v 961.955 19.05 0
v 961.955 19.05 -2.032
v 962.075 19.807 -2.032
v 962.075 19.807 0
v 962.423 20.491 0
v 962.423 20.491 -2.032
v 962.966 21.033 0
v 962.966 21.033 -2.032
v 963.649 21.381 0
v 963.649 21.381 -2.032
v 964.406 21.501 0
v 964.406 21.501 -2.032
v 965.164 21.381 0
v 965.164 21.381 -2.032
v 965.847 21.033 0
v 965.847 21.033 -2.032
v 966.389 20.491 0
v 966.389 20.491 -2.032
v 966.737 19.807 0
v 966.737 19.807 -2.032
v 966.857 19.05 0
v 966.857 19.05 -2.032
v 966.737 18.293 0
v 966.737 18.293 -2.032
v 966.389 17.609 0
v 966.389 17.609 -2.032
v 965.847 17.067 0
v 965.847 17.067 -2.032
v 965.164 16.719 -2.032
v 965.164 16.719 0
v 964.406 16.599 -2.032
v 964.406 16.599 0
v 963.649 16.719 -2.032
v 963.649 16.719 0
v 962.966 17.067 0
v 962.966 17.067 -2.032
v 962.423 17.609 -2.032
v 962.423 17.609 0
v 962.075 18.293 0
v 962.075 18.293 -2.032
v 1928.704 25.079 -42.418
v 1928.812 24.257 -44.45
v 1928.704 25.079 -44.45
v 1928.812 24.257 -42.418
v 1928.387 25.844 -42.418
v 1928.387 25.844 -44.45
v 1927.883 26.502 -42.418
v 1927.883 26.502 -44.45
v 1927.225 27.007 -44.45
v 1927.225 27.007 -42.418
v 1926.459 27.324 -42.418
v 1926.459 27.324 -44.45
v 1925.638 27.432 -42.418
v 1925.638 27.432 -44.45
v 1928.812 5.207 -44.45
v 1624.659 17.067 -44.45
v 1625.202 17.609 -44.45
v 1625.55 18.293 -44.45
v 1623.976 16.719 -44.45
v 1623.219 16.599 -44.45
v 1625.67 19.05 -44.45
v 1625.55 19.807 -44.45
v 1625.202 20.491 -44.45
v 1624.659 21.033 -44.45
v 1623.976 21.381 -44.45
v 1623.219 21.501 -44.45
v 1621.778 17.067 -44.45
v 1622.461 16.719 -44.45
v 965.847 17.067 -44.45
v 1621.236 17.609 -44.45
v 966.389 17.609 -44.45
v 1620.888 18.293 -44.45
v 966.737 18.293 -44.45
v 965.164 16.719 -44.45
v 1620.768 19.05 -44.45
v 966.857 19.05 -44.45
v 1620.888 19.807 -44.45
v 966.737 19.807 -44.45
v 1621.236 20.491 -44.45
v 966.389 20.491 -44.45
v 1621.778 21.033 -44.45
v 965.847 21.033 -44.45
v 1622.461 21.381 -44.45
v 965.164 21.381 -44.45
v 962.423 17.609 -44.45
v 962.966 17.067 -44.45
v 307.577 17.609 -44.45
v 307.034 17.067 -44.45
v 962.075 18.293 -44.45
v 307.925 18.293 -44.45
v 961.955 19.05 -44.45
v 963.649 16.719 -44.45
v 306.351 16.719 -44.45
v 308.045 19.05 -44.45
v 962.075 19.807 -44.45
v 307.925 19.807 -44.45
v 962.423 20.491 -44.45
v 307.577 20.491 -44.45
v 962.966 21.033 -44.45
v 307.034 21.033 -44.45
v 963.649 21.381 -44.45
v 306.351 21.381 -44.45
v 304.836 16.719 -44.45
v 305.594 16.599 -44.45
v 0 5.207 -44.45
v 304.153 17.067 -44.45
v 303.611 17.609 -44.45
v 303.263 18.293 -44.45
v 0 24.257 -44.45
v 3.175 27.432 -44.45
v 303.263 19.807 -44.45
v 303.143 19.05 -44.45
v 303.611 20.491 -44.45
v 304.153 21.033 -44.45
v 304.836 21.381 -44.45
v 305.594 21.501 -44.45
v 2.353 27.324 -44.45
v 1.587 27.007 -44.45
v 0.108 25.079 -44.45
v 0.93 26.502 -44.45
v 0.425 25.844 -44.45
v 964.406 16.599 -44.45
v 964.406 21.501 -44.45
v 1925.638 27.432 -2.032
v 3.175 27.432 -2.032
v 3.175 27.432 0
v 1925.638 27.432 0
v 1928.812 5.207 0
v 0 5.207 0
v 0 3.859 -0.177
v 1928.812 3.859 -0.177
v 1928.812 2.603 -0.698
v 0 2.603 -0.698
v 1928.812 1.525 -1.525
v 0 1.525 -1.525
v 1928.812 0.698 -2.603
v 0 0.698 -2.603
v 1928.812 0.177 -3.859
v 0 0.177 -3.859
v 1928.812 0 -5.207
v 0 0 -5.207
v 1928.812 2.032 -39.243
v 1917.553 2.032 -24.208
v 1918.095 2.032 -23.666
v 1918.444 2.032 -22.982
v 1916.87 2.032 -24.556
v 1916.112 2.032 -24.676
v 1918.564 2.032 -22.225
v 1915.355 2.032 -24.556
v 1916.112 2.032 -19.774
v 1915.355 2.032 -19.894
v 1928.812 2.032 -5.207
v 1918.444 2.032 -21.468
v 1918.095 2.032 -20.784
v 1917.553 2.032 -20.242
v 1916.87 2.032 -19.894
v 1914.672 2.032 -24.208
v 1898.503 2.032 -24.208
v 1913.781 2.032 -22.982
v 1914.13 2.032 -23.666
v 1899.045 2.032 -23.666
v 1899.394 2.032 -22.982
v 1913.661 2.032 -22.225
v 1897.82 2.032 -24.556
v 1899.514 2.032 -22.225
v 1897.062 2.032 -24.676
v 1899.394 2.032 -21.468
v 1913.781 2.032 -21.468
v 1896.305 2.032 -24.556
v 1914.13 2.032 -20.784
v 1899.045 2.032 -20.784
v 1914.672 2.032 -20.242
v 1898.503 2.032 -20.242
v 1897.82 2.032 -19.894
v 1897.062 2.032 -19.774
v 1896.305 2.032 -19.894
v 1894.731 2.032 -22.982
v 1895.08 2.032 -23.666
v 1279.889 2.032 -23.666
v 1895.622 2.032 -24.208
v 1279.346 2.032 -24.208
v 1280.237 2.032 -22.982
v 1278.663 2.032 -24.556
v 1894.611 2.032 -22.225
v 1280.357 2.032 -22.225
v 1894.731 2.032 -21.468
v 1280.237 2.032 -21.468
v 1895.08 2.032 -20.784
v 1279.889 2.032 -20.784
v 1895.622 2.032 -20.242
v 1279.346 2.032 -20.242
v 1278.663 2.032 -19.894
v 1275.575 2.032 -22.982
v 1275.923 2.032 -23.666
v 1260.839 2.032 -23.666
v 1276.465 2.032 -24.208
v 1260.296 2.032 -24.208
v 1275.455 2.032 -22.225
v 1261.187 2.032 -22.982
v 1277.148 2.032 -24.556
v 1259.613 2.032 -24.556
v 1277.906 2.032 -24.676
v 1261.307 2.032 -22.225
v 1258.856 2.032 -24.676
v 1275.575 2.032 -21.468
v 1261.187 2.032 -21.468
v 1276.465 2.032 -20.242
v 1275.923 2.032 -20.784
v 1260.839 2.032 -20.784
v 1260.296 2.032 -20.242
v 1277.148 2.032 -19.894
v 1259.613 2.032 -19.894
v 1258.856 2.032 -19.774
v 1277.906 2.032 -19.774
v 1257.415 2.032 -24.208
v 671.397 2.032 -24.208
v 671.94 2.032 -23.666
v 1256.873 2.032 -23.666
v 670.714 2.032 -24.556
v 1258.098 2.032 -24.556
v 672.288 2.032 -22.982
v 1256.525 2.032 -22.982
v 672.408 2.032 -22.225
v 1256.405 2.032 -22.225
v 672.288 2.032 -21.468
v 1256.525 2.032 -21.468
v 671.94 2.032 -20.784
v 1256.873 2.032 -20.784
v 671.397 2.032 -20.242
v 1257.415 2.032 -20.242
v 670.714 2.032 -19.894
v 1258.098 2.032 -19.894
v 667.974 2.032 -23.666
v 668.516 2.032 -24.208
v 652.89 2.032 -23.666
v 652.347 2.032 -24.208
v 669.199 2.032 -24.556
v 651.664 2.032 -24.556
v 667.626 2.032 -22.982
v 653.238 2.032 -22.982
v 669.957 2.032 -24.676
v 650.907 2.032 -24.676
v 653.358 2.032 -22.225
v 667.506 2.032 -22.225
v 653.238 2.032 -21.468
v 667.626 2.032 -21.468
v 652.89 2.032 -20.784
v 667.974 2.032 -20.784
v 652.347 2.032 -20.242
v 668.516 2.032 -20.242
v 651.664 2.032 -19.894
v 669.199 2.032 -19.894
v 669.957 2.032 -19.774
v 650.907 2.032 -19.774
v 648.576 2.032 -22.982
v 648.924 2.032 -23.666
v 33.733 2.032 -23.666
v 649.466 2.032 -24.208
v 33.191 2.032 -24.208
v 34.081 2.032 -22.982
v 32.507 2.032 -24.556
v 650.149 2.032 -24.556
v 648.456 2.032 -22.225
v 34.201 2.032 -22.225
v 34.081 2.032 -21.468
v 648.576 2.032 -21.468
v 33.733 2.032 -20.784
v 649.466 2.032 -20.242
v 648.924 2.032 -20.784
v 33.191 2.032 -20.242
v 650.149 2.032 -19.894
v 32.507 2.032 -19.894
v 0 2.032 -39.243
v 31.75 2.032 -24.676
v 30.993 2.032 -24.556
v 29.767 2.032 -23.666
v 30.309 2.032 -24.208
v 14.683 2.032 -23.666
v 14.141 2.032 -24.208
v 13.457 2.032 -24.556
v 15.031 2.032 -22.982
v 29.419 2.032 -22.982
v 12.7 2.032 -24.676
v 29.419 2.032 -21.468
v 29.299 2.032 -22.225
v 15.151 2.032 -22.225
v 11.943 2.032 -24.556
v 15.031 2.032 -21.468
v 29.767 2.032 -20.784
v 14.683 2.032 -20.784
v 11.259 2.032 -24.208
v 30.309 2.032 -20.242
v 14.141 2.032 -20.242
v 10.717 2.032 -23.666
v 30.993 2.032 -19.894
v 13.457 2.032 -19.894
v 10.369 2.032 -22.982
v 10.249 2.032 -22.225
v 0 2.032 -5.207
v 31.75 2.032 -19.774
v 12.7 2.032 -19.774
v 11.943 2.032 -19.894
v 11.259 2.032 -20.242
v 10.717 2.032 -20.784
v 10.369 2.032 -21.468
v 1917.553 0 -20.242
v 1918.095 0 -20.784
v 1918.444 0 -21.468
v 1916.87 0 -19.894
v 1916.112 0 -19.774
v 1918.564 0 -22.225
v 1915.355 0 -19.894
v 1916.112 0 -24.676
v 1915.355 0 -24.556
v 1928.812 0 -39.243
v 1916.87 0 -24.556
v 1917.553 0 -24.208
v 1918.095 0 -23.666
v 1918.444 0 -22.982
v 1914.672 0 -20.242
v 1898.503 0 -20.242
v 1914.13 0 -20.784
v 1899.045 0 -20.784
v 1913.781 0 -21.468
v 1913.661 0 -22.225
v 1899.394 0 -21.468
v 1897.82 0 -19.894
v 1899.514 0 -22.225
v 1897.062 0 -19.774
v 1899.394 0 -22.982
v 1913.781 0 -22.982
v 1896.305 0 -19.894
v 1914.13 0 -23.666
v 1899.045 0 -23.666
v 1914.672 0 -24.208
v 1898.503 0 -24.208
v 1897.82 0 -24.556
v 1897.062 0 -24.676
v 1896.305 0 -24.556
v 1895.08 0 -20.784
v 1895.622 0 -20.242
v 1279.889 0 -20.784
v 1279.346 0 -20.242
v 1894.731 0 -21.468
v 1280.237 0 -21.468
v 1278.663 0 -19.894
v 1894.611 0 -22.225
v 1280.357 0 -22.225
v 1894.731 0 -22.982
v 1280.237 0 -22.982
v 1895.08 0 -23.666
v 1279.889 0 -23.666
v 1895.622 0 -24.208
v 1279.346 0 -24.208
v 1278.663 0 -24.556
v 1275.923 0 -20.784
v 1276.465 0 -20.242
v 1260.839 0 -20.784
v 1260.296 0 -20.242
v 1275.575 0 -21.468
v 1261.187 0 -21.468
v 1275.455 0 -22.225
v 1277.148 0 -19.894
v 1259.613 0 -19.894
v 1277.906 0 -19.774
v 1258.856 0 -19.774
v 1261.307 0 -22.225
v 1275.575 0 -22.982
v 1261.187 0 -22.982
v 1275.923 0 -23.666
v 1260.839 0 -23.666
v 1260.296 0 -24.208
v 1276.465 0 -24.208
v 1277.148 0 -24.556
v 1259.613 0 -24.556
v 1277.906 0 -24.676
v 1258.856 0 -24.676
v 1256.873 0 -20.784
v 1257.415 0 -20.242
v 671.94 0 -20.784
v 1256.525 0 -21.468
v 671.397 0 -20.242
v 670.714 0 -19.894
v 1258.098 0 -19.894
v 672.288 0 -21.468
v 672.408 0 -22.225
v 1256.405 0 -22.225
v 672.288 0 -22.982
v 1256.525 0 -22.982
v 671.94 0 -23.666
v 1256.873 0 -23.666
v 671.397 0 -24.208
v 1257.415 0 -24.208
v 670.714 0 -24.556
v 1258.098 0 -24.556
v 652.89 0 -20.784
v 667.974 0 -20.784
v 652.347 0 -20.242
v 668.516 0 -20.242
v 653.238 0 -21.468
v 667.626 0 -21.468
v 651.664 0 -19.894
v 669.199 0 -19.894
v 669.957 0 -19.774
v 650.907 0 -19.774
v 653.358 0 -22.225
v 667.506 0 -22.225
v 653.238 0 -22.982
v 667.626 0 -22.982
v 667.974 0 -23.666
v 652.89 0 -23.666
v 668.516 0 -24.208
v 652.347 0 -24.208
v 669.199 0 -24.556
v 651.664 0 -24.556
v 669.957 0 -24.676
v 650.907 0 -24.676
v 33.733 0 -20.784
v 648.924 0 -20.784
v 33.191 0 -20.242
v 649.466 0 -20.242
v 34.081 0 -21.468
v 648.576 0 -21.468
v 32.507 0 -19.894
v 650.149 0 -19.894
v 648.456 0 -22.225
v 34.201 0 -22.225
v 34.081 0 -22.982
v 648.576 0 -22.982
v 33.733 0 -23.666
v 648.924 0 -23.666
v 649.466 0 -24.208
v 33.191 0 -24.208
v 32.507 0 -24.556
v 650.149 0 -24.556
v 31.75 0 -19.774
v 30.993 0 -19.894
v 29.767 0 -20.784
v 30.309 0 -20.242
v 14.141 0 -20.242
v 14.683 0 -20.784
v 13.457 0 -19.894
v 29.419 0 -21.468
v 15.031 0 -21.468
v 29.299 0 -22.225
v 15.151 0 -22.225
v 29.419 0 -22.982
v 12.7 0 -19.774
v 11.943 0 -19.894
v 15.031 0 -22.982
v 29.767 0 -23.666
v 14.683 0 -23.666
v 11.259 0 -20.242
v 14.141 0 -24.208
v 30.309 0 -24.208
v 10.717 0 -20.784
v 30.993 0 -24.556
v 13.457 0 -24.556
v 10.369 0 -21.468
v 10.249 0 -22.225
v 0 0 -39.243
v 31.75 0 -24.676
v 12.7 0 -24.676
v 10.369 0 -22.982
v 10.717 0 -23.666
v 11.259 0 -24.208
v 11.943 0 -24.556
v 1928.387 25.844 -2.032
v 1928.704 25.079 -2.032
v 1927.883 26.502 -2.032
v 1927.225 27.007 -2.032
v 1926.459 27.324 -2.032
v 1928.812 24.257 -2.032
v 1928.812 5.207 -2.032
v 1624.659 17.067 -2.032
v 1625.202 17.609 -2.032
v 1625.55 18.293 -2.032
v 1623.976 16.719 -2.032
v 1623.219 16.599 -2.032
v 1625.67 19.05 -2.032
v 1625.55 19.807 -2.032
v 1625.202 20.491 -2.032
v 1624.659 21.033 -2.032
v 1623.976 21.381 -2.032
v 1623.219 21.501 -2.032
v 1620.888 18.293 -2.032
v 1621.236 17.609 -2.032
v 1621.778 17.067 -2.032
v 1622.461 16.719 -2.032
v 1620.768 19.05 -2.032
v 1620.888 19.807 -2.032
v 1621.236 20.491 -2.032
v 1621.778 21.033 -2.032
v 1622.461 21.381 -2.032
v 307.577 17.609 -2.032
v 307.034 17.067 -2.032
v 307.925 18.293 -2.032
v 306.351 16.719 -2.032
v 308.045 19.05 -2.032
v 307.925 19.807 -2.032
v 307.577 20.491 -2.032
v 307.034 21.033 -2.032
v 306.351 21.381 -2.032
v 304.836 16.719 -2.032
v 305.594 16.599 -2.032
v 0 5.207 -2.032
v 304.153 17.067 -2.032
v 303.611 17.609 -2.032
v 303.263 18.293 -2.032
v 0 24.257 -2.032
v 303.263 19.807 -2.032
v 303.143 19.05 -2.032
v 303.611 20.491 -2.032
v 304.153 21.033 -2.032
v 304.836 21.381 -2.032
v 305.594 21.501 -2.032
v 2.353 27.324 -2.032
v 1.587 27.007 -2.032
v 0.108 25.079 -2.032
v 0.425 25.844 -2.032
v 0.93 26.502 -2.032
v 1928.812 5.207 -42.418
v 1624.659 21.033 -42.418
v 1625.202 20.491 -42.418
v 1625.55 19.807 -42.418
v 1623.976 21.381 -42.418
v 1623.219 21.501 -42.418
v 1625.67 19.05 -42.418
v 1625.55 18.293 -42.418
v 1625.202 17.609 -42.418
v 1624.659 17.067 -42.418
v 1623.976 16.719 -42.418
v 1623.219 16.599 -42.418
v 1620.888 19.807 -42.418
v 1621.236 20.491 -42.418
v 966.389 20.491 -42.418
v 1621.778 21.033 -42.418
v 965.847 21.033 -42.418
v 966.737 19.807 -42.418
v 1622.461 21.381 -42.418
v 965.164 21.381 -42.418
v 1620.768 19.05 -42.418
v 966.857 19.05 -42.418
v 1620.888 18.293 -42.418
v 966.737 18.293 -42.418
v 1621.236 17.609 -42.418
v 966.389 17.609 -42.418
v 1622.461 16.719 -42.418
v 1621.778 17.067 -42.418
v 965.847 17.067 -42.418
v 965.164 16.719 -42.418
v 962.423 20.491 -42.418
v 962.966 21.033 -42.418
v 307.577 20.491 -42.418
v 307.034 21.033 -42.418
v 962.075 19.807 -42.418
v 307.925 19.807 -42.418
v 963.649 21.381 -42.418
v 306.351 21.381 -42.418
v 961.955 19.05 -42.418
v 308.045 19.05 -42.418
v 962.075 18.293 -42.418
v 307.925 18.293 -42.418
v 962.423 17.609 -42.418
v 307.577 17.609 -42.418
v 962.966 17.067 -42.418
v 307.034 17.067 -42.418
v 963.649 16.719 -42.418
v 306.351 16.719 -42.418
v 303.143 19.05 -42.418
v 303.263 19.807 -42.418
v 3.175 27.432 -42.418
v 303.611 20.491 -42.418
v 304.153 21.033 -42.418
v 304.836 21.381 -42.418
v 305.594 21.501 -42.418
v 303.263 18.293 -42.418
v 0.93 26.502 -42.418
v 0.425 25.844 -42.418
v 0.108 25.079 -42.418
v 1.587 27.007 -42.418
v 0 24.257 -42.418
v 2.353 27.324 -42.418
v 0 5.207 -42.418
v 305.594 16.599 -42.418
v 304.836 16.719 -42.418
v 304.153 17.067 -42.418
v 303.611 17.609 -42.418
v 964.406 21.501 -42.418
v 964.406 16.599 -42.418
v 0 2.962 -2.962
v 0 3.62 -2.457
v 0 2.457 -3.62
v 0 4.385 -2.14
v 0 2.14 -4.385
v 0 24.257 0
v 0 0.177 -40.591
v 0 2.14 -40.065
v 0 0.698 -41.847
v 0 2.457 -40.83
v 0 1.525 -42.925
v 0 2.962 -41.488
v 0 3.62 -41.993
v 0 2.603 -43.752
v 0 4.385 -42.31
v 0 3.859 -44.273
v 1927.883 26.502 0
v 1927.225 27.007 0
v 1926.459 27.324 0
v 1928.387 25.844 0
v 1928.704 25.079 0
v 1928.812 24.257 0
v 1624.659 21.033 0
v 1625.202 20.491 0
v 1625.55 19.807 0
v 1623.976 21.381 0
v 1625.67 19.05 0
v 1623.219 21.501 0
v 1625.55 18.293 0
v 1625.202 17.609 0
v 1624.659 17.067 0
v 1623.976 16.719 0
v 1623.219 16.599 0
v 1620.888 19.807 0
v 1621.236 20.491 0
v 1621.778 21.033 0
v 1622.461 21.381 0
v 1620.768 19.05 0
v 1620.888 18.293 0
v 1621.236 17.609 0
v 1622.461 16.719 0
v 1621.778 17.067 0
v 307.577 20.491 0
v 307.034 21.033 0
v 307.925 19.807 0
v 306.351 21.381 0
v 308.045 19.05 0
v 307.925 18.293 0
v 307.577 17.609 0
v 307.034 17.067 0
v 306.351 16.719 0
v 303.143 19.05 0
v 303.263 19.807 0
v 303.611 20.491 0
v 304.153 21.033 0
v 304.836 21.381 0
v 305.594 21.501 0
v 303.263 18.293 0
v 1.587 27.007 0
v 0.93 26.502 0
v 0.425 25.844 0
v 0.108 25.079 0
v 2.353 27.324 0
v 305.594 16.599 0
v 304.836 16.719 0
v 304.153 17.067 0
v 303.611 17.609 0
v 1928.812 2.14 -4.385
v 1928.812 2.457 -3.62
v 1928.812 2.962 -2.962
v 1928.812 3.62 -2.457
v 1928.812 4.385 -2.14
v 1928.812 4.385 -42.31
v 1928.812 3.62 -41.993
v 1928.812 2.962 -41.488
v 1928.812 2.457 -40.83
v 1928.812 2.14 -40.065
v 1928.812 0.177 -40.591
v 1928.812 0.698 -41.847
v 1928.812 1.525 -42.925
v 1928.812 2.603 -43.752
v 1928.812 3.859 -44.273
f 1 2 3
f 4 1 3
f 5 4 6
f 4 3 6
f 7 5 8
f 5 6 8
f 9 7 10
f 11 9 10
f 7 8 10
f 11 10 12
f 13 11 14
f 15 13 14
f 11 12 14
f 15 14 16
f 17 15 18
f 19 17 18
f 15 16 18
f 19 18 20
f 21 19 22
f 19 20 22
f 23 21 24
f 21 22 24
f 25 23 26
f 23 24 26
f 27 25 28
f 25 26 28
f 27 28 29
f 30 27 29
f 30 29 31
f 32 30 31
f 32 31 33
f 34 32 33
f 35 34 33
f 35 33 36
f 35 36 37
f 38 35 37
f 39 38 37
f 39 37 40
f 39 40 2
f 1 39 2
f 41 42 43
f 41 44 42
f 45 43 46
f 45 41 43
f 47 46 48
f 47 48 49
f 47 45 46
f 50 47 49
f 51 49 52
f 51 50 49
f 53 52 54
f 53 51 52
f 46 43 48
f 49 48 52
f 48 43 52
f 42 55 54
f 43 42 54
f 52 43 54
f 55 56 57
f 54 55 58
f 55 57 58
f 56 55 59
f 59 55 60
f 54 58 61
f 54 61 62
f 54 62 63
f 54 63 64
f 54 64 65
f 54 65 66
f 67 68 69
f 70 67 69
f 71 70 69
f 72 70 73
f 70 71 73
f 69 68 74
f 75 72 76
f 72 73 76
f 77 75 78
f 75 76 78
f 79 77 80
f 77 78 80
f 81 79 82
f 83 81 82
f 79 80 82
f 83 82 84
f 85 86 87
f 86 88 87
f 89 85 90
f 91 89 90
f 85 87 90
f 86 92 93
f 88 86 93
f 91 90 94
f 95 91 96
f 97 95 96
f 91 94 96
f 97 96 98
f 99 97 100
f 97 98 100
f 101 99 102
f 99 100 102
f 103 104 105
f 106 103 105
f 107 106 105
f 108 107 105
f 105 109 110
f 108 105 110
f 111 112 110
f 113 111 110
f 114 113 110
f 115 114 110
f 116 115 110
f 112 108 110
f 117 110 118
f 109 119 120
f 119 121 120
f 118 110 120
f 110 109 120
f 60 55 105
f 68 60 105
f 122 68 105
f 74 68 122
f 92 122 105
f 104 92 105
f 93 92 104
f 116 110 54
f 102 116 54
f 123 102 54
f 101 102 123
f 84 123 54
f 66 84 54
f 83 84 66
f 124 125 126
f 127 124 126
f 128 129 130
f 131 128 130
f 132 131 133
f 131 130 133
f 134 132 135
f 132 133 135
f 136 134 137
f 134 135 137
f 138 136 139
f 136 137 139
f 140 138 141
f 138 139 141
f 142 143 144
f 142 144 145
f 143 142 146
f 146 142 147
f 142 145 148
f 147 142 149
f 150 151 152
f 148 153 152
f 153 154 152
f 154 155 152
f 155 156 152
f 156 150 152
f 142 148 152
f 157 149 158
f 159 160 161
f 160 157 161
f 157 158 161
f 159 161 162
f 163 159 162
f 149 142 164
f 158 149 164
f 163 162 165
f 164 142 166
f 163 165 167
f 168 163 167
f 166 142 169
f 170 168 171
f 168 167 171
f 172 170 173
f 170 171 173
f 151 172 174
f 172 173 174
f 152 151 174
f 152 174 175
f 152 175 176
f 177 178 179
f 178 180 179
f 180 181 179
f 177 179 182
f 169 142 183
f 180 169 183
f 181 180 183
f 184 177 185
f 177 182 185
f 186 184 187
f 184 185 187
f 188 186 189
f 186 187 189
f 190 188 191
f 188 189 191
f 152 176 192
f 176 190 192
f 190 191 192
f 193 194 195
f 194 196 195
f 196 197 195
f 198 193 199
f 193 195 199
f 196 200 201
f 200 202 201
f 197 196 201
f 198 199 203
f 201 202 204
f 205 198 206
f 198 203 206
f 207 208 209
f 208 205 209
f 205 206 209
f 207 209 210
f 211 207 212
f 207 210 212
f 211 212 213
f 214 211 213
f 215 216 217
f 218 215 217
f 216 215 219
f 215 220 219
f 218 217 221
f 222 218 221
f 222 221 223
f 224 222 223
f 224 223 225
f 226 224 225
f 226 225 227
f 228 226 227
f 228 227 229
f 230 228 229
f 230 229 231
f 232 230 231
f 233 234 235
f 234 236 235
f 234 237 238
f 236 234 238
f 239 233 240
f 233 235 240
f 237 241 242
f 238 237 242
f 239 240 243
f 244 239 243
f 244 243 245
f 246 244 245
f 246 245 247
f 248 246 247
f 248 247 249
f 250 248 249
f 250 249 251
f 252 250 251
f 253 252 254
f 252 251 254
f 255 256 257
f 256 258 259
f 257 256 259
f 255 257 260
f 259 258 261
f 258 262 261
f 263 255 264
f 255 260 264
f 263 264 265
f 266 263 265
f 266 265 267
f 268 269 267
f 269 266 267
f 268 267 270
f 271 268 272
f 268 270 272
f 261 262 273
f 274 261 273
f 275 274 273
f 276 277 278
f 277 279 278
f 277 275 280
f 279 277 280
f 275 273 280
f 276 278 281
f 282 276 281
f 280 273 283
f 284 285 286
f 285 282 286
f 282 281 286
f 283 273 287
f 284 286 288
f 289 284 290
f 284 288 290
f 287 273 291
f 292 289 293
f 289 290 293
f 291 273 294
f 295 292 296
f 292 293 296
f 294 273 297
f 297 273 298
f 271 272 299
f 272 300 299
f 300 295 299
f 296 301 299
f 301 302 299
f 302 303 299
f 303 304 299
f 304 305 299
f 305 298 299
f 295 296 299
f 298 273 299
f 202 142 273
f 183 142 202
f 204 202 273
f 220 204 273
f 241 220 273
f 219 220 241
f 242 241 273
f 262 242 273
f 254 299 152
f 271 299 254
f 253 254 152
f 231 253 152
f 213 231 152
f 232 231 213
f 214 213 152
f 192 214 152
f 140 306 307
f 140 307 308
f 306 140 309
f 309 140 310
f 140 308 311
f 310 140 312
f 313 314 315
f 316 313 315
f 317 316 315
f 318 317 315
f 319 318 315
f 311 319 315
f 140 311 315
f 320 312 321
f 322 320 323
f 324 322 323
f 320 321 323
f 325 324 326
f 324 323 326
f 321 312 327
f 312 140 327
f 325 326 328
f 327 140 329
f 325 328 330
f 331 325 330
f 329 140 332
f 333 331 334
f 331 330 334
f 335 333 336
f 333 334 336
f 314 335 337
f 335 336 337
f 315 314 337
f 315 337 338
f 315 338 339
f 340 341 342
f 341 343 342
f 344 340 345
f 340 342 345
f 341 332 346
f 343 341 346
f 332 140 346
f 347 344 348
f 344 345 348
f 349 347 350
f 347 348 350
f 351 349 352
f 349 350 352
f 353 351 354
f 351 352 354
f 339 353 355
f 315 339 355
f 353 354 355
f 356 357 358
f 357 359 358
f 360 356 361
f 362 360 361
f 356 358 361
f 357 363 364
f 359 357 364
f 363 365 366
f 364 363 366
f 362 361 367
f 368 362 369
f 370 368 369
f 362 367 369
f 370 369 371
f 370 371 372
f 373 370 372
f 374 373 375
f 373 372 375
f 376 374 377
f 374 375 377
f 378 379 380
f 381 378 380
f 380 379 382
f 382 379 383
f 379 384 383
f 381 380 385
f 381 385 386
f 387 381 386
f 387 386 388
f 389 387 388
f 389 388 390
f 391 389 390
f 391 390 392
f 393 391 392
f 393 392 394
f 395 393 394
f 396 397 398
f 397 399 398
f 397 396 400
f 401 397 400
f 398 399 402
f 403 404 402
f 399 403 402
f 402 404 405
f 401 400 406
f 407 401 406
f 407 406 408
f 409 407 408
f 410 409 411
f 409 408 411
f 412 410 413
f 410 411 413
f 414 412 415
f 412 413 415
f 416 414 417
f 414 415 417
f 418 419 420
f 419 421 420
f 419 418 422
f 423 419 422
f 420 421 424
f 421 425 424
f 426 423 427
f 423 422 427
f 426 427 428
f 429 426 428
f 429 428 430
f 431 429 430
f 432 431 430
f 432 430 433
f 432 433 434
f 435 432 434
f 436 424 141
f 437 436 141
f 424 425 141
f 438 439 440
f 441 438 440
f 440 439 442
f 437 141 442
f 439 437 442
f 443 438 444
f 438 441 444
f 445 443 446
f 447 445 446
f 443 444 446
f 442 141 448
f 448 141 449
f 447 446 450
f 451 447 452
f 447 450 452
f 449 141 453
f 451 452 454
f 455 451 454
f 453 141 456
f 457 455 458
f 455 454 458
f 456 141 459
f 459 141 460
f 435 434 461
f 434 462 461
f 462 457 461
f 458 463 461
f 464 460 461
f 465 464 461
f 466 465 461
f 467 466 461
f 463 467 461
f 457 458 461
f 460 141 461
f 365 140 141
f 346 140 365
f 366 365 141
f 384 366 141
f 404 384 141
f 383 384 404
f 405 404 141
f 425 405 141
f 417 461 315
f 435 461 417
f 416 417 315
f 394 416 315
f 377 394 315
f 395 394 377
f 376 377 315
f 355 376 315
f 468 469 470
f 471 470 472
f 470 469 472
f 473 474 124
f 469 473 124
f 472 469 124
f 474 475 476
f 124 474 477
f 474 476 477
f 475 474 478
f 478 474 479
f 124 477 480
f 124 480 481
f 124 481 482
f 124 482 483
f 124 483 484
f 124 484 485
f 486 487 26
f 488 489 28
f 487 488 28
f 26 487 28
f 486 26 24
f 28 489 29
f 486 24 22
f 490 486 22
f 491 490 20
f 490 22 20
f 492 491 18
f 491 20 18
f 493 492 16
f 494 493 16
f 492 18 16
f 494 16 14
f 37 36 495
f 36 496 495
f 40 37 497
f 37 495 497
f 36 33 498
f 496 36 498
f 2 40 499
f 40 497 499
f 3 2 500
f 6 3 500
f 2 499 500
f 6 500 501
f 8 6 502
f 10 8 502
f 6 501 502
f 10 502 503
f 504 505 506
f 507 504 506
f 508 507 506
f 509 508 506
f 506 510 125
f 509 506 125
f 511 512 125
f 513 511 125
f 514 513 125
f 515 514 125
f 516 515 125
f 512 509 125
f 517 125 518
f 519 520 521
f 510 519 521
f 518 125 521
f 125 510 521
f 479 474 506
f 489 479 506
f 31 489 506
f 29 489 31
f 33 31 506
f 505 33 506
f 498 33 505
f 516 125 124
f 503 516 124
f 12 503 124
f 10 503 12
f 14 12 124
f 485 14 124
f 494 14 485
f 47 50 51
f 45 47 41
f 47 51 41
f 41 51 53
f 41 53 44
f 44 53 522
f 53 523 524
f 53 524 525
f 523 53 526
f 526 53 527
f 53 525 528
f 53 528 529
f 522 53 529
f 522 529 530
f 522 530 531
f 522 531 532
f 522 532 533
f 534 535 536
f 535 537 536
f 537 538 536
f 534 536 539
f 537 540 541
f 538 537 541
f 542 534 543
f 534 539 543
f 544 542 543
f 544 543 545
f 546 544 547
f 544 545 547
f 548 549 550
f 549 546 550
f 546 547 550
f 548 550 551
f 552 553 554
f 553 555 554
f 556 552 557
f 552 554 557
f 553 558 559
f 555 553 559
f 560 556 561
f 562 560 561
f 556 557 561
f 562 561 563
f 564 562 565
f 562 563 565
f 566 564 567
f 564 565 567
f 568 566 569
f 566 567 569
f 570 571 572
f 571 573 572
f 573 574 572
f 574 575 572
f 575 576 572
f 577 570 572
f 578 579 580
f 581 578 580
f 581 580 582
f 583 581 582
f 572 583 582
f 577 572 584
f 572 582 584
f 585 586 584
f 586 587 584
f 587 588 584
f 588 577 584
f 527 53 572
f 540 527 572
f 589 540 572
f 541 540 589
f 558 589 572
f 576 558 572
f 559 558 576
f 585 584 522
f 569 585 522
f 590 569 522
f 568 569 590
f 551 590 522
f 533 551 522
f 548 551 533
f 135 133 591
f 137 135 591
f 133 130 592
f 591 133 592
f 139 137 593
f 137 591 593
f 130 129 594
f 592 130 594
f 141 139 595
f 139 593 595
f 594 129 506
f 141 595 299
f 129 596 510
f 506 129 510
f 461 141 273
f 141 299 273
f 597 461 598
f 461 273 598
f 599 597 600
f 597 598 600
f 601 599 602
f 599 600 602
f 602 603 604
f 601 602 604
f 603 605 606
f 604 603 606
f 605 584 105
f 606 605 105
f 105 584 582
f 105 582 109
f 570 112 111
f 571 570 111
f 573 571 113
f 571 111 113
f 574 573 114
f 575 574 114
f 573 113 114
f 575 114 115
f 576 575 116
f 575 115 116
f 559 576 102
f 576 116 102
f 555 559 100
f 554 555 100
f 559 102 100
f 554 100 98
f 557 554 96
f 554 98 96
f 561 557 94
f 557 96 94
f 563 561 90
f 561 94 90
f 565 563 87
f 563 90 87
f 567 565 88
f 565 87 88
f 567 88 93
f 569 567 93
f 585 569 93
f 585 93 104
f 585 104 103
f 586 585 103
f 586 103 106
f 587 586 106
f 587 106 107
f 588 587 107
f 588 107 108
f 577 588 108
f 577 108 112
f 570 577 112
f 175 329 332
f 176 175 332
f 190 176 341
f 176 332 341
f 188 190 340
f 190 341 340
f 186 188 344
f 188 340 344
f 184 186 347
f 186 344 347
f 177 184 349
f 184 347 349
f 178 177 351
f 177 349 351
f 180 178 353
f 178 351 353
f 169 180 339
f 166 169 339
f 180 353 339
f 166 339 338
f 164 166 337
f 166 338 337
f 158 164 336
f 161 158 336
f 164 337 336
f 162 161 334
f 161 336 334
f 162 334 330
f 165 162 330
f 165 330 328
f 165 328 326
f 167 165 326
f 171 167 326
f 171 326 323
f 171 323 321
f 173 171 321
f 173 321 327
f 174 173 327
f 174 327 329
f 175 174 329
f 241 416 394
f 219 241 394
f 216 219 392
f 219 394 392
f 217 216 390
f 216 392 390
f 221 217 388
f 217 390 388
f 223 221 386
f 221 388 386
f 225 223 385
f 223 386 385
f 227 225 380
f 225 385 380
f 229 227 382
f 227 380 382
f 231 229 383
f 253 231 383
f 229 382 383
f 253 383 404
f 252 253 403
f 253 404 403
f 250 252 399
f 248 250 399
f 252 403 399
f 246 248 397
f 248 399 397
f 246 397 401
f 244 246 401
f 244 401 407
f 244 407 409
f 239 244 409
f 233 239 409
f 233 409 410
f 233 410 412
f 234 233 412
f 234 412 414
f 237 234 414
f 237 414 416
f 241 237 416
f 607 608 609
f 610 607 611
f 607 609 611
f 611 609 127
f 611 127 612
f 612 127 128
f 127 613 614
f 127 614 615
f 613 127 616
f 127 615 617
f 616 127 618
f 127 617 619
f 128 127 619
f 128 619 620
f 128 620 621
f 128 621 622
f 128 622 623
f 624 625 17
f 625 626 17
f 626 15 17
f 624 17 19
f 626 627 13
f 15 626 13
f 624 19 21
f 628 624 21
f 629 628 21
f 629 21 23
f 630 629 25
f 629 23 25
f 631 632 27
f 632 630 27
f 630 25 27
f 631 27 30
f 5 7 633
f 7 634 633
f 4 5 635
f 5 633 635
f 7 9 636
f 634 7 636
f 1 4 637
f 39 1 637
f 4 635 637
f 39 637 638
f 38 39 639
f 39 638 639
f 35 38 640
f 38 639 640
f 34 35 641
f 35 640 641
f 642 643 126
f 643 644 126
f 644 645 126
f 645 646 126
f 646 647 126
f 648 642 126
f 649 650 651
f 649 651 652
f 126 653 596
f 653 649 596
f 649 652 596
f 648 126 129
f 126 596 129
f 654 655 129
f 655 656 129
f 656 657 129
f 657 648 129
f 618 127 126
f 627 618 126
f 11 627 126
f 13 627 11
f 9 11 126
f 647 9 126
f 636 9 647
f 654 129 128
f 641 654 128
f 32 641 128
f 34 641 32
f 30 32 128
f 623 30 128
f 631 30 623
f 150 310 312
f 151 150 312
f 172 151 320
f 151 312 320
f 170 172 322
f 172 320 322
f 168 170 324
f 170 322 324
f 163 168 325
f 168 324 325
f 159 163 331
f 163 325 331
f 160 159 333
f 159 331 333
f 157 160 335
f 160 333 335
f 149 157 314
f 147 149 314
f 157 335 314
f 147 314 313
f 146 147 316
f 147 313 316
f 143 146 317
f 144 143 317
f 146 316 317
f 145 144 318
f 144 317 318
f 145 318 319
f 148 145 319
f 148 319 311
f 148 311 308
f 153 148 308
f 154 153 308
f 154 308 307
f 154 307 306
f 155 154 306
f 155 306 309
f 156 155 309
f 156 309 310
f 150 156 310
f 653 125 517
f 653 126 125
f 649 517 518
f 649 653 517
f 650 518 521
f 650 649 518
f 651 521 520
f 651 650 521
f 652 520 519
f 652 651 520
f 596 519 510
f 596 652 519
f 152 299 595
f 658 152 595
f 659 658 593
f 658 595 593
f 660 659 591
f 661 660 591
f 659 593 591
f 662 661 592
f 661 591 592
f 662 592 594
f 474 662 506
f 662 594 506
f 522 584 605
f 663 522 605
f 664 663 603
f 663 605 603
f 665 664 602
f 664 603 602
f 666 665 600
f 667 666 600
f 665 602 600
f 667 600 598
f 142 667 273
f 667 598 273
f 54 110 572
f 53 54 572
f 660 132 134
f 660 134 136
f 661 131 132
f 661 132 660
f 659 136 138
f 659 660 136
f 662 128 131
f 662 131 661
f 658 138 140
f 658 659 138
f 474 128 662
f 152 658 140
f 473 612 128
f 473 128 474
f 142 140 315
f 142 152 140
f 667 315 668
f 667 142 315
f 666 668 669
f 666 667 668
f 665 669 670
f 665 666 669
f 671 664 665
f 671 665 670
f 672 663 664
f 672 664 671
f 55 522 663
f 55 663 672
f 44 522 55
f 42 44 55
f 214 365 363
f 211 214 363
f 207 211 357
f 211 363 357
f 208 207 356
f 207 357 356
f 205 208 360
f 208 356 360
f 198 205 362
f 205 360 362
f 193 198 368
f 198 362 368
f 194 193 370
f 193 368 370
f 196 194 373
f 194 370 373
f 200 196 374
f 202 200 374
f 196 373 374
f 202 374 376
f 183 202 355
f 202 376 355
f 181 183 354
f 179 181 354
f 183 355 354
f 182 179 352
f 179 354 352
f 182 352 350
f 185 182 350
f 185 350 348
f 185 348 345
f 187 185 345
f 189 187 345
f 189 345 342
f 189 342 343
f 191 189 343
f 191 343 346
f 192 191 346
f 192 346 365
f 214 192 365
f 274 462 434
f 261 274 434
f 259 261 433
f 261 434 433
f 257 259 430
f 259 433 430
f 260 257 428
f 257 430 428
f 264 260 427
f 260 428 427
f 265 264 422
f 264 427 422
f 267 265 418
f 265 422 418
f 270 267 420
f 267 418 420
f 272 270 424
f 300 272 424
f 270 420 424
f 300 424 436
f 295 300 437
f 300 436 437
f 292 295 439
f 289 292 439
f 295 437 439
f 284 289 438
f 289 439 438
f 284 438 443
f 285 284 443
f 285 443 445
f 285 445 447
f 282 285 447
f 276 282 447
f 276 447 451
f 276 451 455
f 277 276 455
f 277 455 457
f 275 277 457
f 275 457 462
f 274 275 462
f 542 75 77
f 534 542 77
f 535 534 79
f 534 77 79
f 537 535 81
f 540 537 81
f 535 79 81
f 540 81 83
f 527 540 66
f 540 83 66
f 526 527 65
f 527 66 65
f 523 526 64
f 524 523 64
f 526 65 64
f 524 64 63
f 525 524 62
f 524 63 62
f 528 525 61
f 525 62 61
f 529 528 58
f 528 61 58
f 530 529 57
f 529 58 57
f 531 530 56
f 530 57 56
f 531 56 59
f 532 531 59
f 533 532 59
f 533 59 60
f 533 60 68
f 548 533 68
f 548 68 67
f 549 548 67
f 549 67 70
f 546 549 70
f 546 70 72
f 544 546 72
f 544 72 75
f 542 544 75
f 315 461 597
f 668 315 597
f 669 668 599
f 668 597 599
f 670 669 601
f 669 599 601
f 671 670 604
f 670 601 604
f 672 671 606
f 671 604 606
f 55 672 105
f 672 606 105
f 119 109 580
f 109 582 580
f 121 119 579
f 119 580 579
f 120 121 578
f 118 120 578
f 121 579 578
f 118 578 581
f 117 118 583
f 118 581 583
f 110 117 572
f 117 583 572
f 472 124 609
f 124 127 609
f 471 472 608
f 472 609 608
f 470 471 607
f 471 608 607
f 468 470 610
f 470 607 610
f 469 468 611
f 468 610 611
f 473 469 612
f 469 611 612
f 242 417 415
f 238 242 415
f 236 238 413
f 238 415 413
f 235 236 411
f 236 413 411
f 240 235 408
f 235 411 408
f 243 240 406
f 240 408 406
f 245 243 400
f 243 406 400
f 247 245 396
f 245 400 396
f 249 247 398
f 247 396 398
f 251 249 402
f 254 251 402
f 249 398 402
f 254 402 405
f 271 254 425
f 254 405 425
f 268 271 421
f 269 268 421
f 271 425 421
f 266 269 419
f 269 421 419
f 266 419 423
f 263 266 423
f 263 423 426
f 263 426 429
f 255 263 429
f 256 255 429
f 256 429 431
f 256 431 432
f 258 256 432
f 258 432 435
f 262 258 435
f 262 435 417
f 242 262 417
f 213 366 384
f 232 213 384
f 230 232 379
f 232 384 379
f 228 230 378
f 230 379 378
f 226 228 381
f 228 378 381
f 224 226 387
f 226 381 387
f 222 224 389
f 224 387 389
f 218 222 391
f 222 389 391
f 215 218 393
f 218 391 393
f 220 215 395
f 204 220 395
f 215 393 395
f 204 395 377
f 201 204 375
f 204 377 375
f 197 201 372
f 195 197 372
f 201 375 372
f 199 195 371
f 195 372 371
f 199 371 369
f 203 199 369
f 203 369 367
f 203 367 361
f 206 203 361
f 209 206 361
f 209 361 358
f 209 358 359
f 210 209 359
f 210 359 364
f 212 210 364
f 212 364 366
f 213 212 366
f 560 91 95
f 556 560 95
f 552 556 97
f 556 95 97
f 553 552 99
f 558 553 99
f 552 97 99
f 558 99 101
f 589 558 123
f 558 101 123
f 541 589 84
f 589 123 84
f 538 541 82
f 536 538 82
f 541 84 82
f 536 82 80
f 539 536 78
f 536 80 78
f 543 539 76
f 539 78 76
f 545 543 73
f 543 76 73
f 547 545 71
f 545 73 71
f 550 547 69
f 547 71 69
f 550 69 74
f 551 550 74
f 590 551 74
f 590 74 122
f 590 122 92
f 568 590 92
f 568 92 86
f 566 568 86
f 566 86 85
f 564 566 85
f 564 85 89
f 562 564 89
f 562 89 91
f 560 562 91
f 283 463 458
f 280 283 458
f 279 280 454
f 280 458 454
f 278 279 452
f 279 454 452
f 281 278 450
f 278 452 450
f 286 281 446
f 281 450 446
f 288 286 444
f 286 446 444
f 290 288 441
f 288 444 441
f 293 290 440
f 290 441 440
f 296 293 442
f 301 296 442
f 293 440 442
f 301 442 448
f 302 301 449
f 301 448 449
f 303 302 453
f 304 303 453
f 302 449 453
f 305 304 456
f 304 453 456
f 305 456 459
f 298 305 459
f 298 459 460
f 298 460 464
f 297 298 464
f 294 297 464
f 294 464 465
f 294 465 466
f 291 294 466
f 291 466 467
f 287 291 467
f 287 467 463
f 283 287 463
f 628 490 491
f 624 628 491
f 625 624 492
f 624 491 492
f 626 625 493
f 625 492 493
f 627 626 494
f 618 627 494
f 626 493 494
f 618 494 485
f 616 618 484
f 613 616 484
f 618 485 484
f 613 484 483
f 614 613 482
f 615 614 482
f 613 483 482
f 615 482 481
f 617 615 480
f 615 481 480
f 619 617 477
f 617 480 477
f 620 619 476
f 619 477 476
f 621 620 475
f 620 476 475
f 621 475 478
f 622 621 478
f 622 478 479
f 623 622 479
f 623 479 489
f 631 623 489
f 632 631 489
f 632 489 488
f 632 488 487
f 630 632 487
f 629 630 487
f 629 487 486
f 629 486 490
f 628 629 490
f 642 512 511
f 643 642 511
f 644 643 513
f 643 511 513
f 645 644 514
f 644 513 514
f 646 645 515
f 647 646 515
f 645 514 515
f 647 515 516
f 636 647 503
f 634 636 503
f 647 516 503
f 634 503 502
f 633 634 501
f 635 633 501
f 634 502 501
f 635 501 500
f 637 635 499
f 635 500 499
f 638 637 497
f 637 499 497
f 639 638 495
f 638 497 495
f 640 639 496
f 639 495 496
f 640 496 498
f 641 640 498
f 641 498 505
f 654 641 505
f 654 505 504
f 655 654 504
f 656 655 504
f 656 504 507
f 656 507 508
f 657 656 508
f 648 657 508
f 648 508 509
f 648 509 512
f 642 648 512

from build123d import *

# Parameters (mm, degrees)
BASE_FLANGE1_DEPTH = 1928.8125
SKETCH2_R          = 2.4511
CUT_EXTRUDE1_DEPTH = 1930.51962345
SKETCH3_R          = 2.4511
CUT_EXTRUDE2_DEPTH = 1930.51962345
FILLET1_R          = 3.175


# Sheet-metal steps are written as plain solids
with BuildPart() as part:
    # Sketch1 → Base-Flange1 (new body)
    with BuildSketch(Plane(origin=(0, 0, 0), x_dir=(0, 0, -1), z_dir=(1, 0, 0))):
        with BuildLine():
            Line((0, 27.432), (0, 5.207))
            ThreePointArc((0, 5.207), (1.52509499, 1.52509499), (5.207, 0))
            Line((5.207, 0), (39.243, 0))
            ThreePointArc((39.243, 0), (42.92490501, 1.52509499), (44.45, 5.207))
            Line((44.45, 5.207), (44.45, 27.432))
            Line((44.45, 27.432), (42.418, 27.432))
            Line((42.418, 27.432), (42.418, 5.207))
            ThreePointArc((42.418, 5.207), (41.48806403, 2.96193597), (39.243, 2.032))
            Line((39.243, 2.032), (5.207, 2.032))
            ThreePointArc((5.207, 2.032), (2.96193597, 2.96193597), (2.032, 5.207))
            Line((2.032, 5.207), (2.032, 27.432))
            Line((2.032, 27.432), (0, 27.432))
        make_face()
    extrude(amount=BASE_FLANGE1_DEPTH)

    # Sketch2 → Cut-Extrude1 (cut, through all)
    with BuildSketch(Plane(origin=(0, 0, 0), x_dir=(-1, 0, 0), z_dir=(0, -1, 0))):
        with Locations(Location((-12.7, 22.225, 0), (0, 0, 90))):
            Circle(SKETCH2_R)
        with Locations(Location((-31.75, 22.225, 0), (0, 0, 90))):
            Circle(SKETCH2_R)
        with Locations(Location((-650.90675, 22.225, 0), (0, 0, 90))):
            Circle(SKETCH2_R)
        with Locations(Location((-669.95675, 22.225, 0), (0, 0, 90))):
            Circle(SKETCH2_R)
        with Locations(Location((-1916.1125, 22.225, 0), (0, 0, 270))):
            Circle(SKETCH2_R)
        with Locations(Location((-1897.0625, 22.225, 0), (0, 0, 270))):
            Circle(SKETCH2_R)
        with Locations(Location((-1277.90575, 22.225, 0), (0, 0, 270))):
            Circle(SKETCH2_R)
        with Locations(Location((-1258.85575, 22.225, 0), (0, 0, 270))):
            Circle(SKETCH2_R)
    extrude(amount=-CUT_EXTRUDE1_DEPTH, mode=Mode.SUBTRACT)

    # Sketch3 → Cut-Extrude2 (cut, through all)
    with BuildSketch(Plane(origin=(0, 0, -44.45), x_dir=(-1, 0, 0), z_dir=(0, 0, -1))):
        with Locations((-1623.21875, 19.05)):
            Circle(SKETCH3_R)
        with Locations((-964.40625, 19.05)):
            Circle(SKETCH3_R)
        with Locations((-305.59375, 19.05)):
            Circle(SKETCH3_R)
    extrude(amount=-CUT_EXTRUDE2_DEPTH, mode=Mode.SUBTRACT)

    # Fillet1
    fillet1_edges = [part.edges().sort_by_distance(p)[0] for p in [
        (0, 27.432, -1.016),
        (0, 27.432, -43.434),
        (1928.8125, 27.432, -1.016),
        (1928.8125, 27.432, -43.434),
    ]]
    fillet(fillet1_edges, radius=FILLET1_R)


solid = part.part
